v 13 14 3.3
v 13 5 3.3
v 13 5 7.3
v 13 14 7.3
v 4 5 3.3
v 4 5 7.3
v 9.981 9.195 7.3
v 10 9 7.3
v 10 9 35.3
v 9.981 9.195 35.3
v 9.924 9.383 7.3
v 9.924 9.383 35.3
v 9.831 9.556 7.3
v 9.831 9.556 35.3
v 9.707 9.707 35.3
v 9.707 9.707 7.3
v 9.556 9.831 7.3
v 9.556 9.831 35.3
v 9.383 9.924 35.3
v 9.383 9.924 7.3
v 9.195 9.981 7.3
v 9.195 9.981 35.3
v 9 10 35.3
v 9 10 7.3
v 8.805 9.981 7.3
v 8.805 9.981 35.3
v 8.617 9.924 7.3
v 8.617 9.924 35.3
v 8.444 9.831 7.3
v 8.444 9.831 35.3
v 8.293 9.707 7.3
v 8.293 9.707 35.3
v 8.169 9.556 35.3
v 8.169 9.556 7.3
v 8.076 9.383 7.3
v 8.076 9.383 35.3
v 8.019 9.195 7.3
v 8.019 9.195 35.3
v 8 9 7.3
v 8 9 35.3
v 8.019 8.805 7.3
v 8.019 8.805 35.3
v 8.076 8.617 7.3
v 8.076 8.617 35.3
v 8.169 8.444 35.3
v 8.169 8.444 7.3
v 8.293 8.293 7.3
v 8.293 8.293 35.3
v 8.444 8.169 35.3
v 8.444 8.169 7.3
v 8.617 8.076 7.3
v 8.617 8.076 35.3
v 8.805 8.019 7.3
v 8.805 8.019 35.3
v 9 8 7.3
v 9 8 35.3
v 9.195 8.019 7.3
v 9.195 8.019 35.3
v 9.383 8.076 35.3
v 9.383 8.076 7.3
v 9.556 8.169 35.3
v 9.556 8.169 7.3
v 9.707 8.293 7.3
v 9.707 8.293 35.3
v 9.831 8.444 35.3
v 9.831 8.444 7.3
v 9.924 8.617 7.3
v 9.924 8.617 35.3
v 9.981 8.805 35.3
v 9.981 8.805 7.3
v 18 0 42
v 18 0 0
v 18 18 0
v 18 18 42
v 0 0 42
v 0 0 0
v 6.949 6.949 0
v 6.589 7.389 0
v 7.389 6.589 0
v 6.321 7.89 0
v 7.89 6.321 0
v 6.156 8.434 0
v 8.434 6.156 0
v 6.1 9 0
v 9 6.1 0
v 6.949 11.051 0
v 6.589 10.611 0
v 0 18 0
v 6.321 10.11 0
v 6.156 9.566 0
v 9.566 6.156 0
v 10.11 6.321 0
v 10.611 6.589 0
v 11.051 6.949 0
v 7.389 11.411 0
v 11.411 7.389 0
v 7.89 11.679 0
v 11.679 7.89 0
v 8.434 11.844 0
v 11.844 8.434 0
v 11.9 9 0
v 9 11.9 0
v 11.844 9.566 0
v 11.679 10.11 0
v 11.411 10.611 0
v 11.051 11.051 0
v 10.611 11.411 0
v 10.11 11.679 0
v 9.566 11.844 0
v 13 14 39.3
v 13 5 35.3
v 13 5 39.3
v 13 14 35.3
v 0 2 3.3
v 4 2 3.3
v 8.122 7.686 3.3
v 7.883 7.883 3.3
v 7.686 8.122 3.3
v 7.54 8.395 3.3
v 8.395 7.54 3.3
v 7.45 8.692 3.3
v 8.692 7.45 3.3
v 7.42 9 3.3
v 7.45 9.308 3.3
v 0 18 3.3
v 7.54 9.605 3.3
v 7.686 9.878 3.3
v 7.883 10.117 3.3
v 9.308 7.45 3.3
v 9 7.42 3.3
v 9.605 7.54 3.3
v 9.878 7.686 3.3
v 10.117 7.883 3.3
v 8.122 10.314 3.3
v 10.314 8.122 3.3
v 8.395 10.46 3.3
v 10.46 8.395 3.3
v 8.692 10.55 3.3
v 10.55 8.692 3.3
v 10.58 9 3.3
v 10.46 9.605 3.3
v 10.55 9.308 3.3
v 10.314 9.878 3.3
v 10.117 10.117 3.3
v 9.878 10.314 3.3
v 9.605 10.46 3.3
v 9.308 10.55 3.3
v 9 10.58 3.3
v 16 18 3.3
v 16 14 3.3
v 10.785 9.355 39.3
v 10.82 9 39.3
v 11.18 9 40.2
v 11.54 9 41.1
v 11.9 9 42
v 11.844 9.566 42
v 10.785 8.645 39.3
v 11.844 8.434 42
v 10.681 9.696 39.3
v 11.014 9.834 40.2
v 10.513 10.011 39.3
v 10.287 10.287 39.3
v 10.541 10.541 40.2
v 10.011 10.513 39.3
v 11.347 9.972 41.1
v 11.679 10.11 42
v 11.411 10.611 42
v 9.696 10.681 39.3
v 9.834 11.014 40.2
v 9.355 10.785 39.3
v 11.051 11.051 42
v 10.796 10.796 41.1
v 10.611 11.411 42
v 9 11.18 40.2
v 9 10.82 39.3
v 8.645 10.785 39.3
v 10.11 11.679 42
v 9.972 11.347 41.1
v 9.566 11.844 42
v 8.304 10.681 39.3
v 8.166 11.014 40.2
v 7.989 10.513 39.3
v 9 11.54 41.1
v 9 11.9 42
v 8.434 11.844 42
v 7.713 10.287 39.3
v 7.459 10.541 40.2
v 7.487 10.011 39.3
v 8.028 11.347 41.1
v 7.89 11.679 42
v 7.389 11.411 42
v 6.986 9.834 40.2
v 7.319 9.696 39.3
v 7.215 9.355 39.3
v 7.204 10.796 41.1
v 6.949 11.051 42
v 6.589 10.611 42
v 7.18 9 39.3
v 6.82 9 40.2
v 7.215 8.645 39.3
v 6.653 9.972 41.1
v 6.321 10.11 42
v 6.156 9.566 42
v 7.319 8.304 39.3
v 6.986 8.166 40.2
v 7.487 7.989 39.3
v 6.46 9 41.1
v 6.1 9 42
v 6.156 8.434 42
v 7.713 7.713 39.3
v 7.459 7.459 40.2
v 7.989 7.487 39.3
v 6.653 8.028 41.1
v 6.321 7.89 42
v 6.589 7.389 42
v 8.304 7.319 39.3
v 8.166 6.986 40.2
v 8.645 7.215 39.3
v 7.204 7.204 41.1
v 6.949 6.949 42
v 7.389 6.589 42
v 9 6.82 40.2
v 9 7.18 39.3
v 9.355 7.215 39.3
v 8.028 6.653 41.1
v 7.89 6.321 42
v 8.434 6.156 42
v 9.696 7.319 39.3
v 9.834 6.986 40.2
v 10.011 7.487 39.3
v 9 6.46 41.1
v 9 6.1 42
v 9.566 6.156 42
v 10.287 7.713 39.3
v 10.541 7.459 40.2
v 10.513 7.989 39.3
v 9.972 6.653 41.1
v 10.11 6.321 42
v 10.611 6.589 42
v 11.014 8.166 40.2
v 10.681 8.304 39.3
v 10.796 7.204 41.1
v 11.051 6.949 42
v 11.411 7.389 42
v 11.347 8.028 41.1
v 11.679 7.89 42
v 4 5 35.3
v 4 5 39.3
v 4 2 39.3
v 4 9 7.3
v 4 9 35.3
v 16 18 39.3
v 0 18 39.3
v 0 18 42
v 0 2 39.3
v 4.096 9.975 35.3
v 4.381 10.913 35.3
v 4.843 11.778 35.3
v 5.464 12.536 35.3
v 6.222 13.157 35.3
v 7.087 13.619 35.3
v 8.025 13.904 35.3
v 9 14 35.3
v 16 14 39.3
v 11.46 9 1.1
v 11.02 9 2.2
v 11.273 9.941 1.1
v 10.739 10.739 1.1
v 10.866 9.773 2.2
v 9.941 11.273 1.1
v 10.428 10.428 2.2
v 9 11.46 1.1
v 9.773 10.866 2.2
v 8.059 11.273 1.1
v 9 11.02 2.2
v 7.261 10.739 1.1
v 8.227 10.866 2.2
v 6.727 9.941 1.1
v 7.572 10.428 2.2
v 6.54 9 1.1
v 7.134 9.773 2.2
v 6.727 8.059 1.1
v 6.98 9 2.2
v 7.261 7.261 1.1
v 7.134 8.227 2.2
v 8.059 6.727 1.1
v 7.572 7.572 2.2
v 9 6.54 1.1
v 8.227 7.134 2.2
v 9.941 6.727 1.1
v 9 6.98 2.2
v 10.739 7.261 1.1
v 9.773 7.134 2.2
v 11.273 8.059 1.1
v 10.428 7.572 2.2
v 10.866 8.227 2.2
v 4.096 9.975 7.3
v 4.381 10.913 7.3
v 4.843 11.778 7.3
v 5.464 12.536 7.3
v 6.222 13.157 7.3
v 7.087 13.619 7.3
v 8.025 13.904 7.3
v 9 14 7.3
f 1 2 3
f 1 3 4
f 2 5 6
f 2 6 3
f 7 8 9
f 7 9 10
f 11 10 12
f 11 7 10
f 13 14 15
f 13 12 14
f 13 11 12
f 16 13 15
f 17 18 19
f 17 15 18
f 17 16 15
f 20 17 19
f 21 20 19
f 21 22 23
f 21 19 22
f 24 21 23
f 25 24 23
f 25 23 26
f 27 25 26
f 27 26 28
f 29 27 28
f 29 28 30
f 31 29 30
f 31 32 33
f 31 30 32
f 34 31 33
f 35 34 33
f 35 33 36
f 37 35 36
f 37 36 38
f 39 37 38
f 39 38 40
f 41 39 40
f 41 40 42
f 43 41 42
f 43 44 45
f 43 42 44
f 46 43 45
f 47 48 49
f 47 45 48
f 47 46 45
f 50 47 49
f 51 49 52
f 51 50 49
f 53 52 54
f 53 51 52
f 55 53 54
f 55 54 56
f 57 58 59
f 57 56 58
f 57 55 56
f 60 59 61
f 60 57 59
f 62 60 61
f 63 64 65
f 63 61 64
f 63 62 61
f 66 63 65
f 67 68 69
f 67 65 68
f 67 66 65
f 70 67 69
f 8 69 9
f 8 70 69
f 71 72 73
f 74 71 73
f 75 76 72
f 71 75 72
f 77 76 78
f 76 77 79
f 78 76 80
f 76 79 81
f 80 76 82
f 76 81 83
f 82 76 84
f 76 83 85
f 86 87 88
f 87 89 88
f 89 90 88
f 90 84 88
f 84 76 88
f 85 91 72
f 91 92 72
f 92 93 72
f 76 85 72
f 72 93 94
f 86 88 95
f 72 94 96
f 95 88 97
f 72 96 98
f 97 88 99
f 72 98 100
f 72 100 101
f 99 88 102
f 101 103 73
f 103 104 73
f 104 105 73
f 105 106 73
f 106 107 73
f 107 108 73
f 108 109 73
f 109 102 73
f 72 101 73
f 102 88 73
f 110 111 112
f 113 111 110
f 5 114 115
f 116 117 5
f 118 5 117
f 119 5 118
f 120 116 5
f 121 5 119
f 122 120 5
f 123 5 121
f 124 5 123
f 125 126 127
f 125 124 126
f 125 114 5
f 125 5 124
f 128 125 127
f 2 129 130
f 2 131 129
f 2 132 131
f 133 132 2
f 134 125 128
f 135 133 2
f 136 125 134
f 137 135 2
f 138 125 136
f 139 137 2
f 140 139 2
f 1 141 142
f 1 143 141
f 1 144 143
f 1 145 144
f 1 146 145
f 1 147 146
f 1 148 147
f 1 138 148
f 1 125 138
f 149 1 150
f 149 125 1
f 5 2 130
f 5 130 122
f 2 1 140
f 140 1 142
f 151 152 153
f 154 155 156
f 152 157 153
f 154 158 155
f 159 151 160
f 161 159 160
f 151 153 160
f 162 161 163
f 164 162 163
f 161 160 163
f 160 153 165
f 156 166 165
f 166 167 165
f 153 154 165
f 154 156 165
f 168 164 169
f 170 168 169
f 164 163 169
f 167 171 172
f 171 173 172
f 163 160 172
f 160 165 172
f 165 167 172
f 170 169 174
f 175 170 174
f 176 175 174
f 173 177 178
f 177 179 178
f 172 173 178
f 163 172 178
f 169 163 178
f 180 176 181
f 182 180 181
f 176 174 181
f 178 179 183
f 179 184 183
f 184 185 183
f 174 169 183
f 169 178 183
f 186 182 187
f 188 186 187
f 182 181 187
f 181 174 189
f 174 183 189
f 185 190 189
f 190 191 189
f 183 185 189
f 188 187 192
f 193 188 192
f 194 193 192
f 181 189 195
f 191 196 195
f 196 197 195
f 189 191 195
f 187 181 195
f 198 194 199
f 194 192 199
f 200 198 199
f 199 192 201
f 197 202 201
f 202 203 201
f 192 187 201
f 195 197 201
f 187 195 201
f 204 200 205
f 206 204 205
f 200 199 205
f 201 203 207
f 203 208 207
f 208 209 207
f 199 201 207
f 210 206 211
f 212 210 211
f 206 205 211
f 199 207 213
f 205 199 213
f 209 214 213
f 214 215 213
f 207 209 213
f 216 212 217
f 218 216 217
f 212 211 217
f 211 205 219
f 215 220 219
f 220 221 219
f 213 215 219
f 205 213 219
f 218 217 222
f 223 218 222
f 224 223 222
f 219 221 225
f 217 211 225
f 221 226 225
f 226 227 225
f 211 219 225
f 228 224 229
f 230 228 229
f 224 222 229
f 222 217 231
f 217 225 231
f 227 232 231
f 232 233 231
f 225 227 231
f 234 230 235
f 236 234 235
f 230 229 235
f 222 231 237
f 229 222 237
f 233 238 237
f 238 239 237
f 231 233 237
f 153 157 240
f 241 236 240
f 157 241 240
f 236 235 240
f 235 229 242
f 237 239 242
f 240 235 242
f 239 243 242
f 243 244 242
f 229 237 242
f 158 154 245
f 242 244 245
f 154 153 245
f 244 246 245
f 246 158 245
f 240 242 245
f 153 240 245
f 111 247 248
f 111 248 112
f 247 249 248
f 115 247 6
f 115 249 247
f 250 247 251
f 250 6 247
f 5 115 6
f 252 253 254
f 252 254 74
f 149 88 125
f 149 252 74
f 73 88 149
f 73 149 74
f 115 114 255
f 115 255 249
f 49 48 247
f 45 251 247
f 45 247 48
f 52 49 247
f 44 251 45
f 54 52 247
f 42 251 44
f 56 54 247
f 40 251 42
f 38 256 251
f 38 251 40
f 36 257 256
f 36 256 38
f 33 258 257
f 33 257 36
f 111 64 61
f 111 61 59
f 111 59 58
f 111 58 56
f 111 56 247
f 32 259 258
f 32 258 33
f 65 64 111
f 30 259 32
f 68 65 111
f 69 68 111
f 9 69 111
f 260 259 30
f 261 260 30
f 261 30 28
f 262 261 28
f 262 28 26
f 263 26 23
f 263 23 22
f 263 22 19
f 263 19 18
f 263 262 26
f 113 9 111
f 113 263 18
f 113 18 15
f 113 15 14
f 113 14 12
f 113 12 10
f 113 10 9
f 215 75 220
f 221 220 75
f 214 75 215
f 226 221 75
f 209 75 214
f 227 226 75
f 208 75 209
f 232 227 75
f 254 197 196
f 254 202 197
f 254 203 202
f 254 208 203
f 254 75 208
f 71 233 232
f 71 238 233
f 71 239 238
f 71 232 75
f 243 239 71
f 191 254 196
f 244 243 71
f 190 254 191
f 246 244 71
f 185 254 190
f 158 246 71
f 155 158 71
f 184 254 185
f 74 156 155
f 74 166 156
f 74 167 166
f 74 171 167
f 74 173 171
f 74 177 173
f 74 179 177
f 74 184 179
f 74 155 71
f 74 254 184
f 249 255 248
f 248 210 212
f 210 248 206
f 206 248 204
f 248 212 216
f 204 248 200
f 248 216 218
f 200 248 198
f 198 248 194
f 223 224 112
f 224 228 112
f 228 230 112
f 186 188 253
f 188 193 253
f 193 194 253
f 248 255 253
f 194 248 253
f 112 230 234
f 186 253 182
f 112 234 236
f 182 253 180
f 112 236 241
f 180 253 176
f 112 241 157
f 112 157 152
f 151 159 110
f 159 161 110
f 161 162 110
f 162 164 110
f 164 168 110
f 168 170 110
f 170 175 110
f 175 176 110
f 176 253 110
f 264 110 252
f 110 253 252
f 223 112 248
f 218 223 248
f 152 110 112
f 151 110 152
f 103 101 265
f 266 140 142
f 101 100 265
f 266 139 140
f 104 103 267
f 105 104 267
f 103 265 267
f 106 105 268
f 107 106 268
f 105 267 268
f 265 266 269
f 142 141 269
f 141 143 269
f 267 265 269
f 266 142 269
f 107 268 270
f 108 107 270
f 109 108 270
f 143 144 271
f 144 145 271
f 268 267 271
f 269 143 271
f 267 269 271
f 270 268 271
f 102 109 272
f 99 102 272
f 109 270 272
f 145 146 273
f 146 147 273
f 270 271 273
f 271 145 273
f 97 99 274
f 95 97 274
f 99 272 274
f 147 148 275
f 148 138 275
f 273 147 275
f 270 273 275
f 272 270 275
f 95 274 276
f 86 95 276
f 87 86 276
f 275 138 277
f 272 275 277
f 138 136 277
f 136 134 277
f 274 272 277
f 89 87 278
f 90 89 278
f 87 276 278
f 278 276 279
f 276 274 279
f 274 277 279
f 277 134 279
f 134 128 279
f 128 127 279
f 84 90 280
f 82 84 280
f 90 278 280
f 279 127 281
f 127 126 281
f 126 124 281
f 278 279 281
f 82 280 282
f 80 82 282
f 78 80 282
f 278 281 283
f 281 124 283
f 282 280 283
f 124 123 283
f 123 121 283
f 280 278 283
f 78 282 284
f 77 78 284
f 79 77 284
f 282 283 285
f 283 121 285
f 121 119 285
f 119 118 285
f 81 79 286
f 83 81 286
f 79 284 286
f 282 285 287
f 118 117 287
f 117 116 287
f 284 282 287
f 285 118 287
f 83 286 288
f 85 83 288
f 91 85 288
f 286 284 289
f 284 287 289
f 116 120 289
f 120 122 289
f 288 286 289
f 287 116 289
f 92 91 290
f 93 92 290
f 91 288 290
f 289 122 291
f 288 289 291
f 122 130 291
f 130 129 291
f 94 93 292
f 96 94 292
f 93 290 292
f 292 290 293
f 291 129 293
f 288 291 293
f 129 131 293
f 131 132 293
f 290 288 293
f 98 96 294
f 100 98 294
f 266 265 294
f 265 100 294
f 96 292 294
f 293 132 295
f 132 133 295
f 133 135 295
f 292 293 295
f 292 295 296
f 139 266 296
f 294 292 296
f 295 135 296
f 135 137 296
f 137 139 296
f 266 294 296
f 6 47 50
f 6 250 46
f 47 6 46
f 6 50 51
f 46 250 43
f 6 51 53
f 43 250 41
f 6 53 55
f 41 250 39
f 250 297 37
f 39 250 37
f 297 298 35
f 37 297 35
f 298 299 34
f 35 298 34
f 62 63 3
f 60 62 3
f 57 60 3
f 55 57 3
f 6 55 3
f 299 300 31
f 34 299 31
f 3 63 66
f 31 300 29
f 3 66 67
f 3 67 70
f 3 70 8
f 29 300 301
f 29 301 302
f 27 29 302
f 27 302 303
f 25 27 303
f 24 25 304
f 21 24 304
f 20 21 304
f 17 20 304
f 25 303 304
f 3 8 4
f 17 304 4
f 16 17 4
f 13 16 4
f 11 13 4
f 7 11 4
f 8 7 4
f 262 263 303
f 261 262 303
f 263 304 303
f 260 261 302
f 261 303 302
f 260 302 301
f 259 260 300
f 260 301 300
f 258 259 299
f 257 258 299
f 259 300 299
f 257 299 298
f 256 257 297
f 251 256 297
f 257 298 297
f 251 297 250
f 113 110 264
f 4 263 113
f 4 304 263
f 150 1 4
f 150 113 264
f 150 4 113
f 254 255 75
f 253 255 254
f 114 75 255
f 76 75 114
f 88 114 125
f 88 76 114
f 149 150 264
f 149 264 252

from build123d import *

# Parameters (mm, degrees)
BOX013_W          = 18
BOX013_H          = 18
BOX013_DEPTH      = 36
CYLINDER006_R     = 1
CYLINDER006_DEPTH = 70
BOX011_W          = 18
BOX011_H          = 18
BOX011_DEPTH      = 4
ARRAY005_Z_COUNT  = 2
ARRAY005_Z_PITCH  = 32
BOX012_W          = 18
BOX012_H          = 18
BOX012_DEPTH      = 36
BOX010_W          = 18
BOX010_H          = 18
BOX010_DEPTH      = 42
FILLET_R          = 5


with BuildPart() as cube013:
    # Box013 → Box013 (new body)
    with BuildSketch(Plane(origin=(-2, 14, 3.3), x_dir=(1, 0, 0), z_dir=(0, 0, 1))):
        with Locations((9, 9)):
            Rectangle(BOX013_W, BOX013_H)
    extrude(amount=BOX013_DEPTH)


with BuildPart() as cylinder006:
    # Cylinder006 → Cylinder006 (new body)
    with BuildSketch(Plane(origin=(9, 9, -17), x_dir=(1, 0, 0), z_dir=(0, 0, 1))):
        Circle(CYLINDER006_R)
    extrude(amount=CYLINDER006_DEPTH)


with BuildPart() as array005:
    # Box011 → Box011 (new body)
    with BuildSketch(Plane(origin=(-5, 5, 3.3), x_dir=(1, 0, 0), z_dir=(0, 0, 1))):
        with Locations((9, 9)):
            Rectangle(BOX011_W, BOX011_H)
    extrude(amount=BOX011_DEPTH)

    # Array005 Z: Array005 ×2


with BuildPart() as array005_1:
    add(array005.part)
    with Locations(*[(0, 0, i * ARRAY005_Z_PITCH) for i in range(1, ARRAY005_Z_COUNT)]):
        add(array005.part)


with BuildPart() as cone:
    # Cone → Cone (revolve)
    with BuildSketch(Plane(origin=(9, 9, 0), x_dir=(1, 0, 0), z_dir=(0, -1, 0))):
        Polygon((0, 0), (2.9, 0), (1.5, 3.5), (0, 3.5), align=None)
    revolve(axis=Axis((9, 9, 0), (0, 0, 1)))


with BuildPart() as cone001:
    # Cone001 → Cone001 (revolve)
    with BuildSketch(Plane(origin=(9, 9, 38.5), x_dir=(1, 0, 0), z_dir=(0, -1, 0))):
        Polygon((0, 0), (1.5, 0), (2.9, 3.5), (0, 3.5), align=None)
    revolve(axis=Axis((9, 9, 38.5), (0, 0, 1)))


with BuildPart() as fusion003:
    # Box012 → Box012 (new body)
    with BuildSketch(Plane(origin=(-14, 2, 3.3), x_dir=(1, 0, 0), z_dir=(0, 0, 1))):
        with Locations((9, 9)):
            Rectangle(BOX012_W, BOX012_H)
    extrude(amount=BOX012_DEPTH)

    # Fusion003: union Cube013, Cylinder006, Array005, Cone, Cone001
    add(cube013.part)
    add(cylinder006.part)
    add(array005_1.part)
    add(cone.part)
    add(cone001.part)


with BuildPart() as corner_clone:
    # Box010 → Box010 (new body)
    with BuildSketch(Plane.XY):
        with Locations((9, 9)):
            Rectangle(BOX010_W, BOX010_H)
    extrude(amount=BOX010_DEPTH)

    # Cut005: cut Fusion003
    add(fusion003.part, mode=Mode.SUBTRACT)

    # Fillet
    fillet_edges = [corner_clone.edges().sort_by_distance(p)[0] for p in [
        (4, 14, 21.3),
    ]]
    fillet(fillet_edges, radius=FILLET_R)


solid = corner_clone.part
